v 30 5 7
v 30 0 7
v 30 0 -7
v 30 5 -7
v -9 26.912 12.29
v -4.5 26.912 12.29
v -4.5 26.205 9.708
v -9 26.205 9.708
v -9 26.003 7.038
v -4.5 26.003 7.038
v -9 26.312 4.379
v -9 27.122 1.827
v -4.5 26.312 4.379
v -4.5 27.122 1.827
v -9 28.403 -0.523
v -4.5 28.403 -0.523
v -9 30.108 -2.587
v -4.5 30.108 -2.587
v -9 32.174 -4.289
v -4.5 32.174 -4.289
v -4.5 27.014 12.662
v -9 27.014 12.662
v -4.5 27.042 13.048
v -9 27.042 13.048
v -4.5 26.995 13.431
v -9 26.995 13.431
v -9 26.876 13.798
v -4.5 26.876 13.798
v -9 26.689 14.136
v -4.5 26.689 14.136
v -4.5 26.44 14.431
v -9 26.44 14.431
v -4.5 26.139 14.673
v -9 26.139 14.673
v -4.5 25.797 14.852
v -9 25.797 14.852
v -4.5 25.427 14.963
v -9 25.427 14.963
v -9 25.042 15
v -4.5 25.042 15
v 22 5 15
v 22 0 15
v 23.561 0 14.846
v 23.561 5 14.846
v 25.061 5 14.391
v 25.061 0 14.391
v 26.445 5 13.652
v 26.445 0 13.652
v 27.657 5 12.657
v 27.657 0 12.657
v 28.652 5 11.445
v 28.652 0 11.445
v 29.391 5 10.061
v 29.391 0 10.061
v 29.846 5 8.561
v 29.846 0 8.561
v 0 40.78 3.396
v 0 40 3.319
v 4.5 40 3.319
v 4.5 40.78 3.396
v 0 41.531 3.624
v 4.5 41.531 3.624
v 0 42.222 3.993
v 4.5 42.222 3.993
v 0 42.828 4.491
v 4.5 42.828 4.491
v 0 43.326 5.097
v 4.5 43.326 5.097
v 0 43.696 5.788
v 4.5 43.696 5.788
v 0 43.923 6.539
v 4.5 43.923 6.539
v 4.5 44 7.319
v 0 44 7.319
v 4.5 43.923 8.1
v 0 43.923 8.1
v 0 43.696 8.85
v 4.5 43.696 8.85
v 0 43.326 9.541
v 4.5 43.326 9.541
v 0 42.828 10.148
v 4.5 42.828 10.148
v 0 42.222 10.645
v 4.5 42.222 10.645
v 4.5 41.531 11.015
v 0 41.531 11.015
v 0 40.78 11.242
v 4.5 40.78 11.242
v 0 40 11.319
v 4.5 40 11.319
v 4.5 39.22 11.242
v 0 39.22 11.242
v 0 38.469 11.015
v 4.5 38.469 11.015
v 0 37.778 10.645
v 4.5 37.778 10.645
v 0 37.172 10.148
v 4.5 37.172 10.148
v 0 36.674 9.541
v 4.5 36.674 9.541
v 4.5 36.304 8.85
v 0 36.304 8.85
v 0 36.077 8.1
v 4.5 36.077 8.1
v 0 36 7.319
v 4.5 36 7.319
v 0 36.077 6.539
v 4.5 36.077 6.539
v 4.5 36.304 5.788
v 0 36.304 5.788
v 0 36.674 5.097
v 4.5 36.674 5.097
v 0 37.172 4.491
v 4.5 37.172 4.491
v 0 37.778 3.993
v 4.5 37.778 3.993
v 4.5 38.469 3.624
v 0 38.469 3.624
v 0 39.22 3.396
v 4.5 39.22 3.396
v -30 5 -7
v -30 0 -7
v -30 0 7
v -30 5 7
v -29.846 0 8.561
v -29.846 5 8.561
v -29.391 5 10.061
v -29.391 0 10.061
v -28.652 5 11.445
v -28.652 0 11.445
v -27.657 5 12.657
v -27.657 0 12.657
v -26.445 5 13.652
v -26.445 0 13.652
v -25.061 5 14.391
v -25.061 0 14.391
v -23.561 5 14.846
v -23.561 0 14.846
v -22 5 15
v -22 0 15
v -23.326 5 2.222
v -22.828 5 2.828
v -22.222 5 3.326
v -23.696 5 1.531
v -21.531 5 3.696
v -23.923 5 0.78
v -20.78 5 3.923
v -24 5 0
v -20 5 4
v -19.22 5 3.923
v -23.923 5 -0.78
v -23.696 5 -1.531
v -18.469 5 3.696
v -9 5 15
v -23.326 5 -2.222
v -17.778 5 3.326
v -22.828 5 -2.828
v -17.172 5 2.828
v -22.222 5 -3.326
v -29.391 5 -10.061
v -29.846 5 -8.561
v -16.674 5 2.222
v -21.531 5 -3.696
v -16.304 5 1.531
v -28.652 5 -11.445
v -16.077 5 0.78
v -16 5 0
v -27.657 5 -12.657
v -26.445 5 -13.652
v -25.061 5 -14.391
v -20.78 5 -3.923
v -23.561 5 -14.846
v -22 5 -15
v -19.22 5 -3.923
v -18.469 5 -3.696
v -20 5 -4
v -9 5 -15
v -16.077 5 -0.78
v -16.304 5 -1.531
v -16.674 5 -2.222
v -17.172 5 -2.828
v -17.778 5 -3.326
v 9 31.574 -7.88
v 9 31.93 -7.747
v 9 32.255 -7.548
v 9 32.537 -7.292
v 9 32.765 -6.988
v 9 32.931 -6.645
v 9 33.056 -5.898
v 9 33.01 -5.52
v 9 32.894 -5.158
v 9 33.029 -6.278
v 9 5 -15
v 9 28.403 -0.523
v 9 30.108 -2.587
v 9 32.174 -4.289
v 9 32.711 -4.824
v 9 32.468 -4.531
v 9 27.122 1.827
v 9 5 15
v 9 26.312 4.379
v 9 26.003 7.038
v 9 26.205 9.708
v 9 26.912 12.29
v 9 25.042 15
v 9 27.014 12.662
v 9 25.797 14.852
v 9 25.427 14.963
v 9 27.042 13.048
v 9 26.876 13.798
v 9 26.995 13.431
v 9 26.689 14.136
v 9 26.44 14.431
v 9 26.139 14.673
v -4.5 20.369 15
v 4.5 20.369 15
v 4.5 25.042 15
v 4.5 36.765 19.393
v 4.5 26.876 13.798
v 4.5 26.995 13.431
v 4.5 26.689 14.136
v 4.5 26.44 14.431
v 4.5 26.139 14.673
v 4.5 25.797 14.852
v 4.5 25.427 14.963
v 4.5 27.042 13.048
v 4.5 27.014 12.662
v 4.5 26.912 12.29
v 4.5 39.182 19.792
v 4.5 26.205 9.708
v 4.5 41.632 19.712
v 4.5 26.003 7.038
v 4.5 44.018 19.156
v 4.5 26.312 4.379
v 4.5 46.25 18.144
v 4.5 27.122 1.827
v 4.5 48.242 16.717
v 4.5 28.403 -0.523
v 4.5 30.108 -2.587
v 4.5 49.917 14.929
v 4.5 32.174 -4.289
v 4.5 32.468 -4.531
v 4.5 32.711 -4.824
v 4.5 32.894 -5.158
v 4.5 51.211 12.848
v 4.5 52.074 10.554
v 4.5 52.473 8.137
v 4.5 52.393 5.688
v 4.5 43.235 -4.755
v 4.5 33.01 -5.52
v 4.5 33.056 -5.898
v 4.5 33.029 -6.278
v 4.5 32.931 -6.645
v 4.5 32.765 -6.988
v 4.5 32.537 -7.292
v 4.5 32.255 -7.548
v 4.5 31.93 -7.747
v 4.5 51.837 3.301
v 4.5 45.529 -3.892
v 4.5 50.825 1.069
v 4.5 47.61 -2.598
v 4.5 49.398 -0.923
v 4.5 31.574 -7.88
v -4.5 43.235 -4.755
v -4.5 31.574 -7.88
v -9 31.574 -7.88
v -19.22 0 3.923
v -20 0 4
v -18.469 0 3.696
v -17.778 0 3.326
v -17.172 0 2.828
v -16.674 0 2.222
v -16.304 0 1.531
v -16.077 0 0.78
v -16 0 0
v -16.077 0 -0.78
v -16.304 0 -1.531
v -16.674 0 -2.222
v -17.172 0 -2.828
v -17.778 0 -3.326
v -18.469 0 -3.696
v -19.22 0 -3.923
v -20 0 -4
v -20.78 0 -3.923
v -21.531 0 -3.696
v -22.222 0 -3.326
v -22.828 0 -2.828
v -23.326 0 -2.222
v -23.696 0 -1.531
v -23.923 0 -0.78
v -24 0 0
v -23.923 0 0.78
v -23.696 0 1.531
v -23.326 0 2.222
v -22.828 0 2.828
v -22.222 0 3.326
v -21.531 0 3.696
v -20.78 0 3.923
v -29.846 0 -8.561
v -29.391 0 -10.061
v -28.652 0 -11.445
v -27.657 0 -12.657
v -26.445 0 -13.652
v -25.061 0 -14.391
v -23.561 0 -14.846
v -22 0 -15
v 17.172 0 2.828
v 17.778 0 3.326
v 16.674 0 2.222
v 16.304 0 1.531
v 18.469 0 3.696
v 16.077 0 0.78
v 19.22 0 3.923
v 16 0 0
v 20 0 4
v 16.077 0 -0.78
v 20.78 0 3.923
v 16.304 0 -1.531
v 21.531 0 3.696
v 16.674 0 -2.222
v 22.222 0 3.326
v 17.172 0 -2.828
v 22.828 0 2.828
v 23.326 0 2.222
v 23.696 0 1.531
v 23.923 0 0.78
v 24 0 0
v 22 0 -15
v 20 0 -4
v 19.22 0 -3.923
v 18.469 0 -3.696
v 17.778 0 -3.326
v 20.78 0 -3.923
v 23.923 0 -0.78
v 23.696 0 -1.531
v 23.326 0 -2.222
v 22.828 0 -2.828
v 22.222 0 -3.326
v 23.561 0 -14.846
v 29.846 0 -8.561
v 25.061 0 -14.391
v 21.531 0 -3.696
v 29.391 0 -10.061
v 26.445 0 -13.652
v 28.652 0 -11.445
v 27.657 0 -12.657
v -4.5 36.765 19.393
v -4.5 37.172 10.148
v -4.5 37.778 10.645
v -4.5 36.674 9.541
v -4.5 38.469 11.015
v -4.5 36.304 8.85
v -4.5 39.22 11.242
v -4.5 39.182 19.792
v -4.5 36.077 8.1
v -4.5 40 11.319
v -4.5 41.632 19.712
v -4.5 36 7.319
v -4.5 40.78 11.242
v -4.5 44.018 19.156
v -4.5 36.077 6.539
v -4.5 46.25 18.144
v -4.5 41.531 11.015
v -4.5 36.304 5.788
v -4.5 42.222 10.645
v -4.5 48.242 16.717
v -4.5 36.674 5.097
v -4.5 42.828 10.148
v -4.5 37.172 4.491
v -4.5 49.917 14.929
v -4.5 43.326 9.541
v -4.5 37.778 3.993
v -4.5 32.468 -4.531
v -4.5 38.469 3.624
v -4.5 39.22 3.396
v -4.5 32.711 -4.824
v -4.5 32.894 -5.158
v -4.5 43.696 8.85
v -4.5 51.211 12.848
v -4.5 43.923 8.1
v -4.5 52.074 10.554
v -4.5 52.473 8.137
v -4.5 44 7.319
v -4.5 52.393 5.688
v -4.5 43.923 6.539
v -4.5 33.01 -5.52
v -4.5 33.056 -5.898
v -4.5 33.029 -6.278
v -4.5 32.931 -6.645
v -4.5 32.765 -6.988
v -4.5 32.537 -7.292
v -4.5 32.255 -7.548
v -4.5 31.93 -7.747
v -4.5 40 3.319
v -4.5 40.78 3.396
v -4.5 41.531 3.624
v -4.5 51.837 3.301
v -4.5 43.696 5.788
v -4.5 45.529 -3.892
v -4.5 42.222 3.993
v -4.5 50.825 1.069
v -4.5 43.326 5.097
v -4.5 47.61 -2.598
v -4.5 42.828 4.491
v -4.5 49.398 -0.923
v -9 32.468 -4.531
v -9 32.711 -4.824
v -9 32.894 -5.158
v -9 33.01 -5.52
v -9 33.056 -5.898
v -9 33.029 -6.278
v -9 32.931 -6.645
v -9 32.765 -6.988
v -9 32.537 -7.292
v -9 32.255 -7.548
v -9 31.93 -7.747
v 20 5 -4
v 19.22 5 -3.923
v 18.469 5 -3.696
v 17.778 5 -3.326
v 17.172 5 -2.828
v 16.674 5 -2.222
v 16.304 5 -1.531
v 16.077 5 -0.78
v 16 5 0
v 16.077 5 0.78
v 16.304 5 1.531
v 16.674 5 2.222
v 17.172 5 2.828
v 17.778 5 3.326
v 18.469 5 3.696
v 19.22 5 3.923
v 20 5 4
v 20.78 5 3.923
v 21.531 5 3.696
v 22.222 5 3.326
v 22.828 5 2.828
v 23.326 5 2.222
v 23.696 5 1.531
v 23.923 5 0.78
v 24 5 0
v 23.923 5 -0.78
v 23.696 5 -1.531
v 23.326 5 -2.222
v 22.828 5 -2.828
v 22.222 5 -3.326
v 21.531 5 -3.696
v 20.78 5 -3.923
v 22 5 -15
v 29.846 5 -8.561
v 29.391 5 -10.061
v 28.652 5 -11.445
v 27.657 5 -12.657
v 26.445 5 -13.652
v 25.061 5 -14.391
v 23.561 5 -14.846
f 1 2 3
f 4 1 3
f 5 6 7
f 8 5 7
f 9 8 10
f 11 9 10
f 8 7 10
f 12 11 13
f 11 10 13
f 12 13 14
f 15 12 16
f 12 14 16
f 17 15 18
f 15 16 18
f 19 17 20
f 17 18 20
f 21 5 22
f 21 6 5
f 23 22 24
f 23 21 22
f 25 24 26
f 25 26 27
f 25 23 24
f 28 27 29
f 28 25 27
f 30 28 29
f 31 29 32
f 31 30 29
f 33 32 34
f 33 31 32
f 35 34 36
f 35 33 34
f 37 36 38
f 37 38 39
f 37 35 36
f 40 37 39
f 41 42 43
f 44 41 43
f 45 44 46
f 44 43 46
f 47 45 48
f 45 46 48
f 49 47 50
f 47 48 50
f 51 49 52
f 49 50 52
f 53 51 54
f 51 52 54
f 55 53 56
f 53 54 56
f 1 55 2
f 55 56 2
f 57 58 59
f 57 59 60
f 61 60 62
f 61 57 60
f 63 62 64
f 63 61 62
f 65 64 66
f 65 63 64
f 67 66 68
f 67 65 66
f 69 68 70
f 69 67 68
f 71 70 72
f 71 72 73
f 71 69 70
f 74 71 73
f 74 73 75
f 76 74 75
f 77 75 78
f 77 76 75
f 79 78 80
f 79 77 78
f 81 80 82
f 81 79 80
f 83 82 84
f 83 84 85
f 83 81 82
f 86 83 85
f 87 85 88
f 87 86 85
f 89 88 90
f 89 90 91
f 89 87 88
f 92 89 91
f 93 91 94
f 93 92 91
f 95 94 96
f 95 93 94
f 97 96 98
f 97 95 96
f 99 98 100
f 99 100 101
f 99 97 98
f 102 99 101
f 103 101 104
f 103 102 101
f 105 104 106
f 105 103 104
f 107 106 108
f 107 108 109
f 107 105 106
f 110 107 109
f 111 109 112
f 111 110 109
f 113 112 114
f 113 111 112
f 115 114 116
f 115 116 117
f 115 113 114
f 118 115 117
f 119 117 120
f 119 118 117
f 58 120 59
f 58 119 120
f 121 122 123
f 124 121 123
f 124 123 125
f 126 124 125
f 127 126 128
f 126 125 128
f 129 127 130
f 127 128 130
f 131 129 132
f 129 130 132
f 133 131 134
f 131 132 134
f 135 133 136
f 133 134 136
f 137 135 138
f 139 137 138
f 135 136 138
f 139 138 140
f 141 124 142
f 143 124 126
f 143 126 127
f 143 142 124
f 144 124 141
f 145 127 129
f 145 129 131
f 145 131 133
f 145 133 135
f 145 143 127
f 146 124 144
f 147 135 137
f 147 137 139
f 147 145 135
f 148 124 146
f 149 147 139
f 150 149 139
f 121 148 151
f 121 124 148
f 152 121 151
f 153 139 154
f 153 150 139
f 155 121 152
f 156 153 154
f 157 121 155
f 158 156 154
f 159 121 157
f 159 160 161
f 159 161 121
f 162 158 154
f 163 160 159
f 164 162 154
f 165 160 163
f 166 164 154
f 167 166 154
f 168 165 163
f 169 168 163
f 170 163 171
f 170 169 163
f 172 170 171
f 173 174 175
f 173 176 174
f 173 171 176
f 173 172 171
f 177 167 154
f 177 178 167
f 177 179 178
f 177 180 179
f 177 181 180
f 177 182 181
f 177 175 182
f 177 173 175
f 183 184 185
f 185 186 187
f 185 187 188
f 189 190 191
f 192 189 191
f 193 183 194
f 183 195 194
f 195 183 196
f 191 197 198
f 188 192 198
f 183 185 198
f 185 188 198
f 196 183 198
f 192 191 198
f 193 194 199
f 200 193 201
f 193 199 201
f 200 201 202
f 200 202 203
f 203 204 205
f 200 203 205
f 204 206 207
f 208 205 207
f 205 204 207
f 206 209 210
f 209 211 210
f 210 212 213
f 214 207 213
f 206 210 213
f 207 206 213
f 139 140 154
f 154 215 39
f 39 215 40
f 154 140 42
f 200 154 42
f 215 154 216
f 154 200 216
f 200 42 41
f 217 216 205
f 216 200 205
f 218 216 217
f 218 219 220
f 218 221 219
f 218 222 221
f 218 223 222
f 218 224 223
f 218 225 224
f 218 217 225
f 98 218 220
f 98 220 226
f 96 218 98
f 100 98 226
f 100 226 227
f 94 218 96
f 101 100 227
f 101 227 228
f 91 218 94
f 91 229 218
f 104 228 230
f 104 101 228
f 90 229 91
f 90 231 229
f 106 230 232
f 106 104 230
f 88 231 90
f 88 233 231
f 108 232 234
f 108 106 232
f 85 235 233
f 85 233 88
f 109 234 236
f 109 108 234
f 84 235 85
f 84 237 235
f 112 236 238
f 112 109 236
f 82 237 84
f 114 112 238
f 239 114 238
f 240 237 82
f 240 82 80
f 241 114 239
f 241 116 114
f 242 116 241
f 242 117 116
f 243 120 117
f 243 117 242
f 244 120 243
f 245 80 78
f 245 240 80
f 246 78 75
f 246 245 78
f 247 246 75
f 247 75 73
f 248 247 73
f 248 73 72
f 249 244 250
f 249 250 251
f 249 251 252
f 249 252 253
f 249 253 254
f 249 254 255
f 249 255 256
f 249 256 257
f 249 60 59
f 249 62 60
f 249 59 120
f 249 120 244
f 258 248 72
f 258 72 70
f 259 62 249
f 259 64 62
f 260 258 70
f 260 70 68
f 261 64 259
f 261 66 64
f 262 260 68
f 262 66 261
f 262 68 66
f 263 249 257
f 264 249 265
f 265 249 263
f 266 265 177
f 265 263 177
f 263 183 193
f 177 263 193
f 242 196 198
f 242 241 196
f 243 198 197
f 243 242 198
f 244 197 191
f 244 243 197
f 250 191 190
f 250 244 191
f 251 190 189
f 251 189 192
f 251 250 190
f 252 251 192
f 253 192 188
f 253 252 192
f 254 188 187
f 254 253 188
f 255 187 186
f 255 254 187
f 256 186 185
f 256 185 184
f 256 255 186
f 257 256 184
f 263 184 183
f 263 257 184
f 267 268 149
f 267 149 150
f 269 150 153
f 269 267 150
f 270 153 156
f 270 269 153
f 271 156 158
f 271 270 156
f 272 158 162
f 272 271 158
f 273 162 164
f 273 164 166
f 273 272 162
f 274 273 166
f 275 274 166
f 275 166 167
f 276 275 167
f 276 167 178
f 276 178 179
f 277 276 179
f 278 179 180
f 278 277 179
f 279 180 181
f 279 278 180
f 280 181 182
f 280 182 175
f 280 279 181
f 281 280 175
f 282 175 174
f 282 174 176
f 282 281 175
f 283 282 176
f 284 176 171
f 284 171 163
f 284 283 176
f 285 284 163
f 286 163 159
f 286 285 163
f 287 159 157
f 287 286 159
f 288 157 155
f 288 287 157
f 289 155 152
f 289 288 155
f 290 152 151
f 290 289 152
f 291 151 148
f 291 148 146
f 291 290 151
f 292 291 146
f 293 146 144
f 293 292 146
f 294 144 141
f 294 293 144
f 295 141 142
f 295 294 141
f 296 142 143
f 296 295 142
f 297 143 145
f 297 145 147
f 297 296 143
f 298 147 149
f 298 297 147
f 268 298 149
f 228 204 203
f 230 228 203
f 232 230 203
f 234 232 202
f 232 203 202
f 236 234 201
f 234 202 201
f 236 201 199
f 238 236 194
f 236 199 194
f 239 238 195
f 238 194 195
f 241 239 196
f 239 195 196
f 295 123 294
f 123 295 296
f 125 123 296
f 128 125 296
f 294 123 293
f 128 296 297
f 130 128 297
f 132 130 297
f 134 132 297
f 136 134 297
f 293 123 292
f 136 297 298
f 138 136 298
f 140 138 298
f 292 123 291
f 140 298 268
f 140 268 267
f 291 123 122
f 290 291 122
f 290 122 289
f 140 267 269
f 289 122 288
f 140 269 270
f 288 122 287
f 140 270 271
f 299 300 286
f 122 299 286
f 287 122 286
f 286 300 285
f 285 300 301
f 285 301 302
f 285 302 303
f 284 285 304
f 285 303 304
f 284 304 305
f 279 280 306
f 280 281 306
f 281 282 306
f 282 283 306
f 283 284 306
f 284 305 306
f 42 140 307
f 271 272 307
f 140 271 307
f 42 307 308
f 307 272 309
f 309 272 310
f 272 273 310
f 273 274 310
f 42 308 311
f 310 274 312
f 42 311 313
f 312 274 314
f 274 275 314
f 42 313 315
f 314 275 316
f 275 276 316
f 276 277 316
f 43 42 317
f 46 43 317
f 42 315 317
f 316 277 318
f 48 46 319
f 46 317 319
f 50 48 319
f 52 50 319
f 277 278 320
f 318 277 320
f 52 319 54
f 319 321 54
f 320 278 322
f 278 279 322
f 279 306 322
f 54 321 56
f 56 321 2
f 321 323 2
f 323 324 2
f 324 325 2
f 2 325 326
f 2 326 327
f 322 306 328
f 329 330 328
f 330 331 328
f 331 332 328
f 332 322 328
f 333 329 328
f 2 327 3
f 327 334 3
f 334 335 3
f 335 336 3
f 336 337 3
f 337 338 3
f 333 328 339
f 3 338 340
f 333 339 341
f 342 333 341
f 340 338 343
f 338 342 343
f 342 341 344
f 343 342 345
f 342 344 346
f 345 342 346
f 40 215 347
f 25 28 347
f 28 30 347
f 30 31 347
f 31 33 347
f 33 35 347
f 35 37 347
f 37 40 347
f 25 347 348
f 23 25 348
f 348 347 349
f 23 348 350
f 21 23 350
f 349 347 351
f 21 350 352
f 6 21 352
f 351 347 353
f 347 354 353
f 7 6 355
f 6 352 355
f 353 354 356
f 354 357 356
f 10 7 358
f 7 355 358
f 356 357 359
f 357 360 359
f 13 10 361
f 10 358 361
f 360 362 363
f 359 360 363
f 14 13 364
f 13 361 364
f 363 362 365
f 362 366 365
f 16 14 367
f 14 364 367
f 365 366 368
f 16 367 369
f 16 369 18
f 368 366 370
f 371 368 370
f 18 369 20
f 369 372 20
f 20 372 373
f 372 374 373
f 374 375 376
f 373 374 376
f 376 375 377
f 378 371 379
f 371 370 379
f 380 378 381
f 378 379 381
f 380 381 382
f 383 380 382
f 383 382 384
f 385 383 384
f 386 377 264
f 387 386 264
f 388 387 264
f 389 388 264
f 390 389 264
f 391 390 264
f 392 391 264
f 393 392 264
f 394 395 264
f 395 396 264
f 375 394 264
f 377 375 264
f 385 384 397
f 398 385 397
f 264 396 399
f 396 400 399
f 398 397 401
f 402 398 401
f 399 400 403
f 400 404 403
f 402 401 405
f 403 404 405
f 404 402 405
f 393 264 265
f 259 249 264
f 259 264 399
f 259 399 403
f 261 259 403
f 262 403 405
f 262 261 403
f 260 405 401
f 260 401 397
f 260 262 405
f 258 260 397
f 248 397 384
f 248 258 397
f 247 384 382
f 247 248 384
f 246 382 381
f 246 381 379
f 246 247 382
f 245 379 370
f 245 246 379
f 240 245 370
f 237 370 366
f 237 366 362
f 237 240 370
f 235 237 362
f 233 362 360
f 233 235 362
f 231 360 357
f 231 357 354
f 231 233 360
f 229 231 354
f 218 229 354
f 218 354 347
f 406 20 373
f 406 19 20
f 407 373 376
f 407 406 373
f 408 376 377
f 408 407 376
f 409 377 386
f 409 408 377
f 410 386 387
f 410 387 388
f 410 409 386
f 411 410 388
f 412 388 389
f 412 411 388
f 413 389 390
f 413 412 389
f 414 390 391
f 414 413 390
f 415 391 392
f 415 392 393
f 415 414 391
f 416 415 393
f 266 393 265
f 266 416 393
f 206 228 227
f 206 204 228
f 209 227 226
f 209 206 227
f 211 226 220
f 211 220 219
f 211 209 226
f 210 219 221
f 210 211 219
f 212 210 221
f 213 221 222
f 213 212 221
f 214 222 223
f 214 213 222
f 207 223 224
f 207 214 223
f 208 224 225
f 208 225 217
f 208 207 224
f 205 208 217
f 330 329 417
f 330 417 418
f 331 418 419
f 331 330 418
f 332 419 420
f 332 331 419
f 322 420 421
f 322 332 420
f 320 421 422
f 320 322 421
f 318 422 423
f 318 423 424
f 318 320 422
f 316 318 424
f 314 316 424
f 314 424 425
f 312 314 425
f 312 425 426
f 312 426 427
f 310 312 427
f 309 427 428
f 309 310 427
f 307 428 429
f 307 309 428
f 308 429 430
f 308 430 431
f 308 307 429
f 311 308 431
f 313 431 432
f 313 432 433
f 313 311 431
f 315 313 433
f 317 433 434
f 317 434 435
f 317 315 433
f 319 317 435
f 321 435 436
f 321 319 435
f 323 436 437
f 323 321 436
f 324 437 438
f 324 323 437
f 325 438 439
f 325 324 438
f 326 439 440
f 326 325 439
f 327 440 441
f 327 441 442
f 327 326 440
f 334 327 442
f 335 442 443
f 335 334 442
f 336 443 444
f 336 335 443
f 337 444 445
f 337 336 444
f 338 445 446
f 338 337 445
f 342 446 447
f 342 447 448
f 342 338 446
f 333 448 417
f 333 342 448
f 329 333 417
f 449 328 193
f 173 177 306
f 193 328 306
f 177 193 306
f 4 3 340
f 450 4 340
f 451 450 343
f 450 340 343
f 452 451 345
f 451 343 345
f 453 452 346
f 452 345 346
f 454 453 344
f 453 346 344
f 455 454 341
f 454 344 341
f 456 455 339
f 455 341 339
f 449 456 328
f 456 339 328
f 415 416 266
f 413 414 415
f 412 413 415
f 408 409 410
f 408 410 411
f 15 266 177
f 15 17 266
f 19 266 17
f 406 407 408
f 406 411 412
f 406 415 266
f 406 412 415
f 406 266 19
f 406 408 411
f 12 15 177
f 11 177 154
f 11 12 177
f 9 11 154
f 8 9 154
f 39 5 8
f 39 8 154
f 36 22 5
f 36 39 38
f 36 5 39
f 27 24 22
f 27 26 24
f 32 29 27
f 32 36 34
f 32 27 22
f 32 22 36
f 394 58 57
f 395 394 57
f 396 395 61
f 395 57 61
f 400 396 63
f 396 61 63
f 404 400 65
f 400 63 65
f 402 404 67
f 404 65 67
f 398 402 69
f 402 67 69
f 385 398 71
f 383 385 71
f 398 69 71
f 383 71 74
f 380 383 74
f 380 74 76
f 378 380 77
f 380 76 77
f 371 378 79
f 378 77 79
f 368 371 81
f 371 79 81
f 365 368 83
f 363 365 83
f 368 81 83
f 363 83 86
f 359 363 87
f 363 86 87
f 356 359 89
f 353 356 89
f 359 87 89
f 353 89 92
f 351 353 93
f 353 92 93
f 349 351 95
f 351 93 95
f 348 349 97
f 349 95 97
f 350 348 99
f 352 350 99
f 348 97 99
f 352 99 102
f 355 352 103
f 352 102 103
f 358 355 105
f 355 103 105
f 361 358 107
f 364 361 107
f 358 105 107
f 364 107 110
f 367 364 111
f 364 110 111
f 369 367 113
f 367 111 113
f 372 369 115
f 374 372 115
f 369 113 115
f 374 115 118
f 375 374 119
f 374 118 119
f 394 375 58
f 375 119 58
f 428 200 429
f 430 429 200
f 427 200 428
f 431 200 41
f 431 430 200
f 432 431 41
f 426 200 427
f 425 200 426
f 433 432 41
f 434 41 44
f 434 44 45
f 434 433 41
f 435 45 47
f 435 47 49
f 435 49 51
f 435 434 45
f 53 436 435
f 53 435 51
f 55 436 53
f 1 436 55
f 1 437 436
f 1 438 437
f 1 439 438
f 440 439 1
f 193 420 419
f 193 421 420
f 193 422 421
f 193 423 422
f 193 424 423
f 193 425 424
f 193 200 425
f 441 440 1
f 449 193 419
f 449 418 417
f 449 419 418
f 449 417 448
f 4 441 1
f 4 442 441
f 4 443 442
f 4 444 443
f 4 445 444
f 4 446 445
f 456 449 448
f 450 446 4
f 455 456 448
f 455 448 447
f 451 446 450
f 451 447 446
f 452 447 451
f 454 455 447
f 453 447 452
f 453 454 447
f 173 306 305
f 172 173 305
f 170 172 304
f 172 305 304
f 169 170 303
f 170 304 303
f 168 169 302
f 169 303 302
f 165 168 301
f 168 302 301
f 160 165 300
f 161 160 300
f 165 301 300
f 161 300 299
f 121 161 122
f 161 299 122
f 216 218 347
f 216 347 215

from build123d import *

# Parameters (mm, degrees)
SKETCH1_R           = 3.999999999999999
BOSS_EXTRUDE1_DEPTH = 5
SKETCH2_R           = 4.000000000000002
BOSS_EXTRUDE2_DEPTH = 4.5
BOSS_EXTRUDE3_DEPTH = 9
FILLET1_R           = 2


with BuildPart() as part:
    # Sketch1 → Boss-Extrude1 (new body)
    with BuildSketch(Plane(origin=(0, 0, 0), x_dir=(1, 0, 0), z_dir=(0, 1, 0))):
        with BuildLine():
            Line((-21.999999999999943, -15), (21.999999999999943, -15))
            ThreePointArc((21.999999999999943, -15), (27.65685424949238, -12.65685424949238), (30, -6.999999999999942))
            Line((30, -6.999999999999942), (30, 6.999999999999942))
            ThreePointArc((30, 6.999999999999942), (27.65685424949238, 12.65685424949238), (21.999999999999943, 15))
            Line((21.999999999999943, 15), (-21.999999999999943, 15))
            ThreePointArc((-21.999999999999943, 15), (-27.656854249492383, 12.65685424949238), (-30.000000000000004, 6.999999999999942))
            Line((-30.000000000000004, 6.999999999999942), (-30.000000000000004, -6.999999999999942))
            ThreePointArc((-30.000000000000004, -6.999999999999942), (-27.656854249492383, -12.656854249492383), (-21.999999999999943, -15))
        make_face()
        with Locations((-20.000000000000004, 0)):
            Circle(SKETCH1_R, mode=Mode.SUBTRACT)
        with Locations((19.99999999999999, 0)):
            Circle(SKETCH1_R, mode=Mode.SUBTRACT)
    extrude(amount=BOSS_EXTRUDE1_DEPTH)

    # Sketch2 → Boss-Extrude2 (add, symmetric)
    with BuildSketch(Plane(origin=(0, 0, 0), x_dir=(0, 0, -1), z_dir=(1, 0, 0))):
        with BuildLine():
            Line((-15, 20.368941598159466), (-15, 5))
            Line((-15, 5), (15, 5))
            Line((15.000000000000002, 5), (4.754898838397974, 43.23523806378153))
            ThreePointArc((4.754898838397979, 43.23523806378153), (-10.554412053996897, 52.07407282861335), (-19.39324681882872, 36.76476193621848))
            Line((-19.39324681882872, 36.76476193621847), (-15, 20.368941598159466))
        make_face()
        with Locations((-7.31917399021537, 40)):
            Circle(SKETCH2_R, mode=Mode.SUBTRACT)
    extrude(amount=BOSS_EXTRUDE2_DEPTH, both=True)

    # Sketch2<4> → Boss-Extrude3 (add, symmetric)
    with BuildSketch(Plane(origin=(0, 0, 0), x_dir=(0, 0, -1), z_dir=(1, 0, 0))):
        with BuildLine():
            Line((-15, 20.368941598159466), (-15, 5))
            Line((-15, 5), (15, 5))
            Line((15.000000000000004, 5), (6.386690828752239, 37.145307448395535))
            ThreePointArc((6.386690828752242, 37.145307448395535), (-1.9659638137879103, 27.06388231319019), (-15, 28.295090269147053))
            Line((-15, 28.295090269147053), (-15, 20.368941598159466))
        make_face()
    extrude(amount=BOSS_EXTRUDE3_DEPTH, both=True)

    # Fillet1
    fillet1_edges = [part.edges().sort_by_distance(p)[0] for p in [
        (-6.75, 37.145307448395535, -6.38669082875224),
        (-6.75, 28.295090269147053, 15),
        (6.75, 37.145307448395535, -6.38669082875224),
        (6.75, 28.295090269147053, 15),
    ]]
    fillet(fillet1_edges, radius=FILLET1_R)


solid = part.part
